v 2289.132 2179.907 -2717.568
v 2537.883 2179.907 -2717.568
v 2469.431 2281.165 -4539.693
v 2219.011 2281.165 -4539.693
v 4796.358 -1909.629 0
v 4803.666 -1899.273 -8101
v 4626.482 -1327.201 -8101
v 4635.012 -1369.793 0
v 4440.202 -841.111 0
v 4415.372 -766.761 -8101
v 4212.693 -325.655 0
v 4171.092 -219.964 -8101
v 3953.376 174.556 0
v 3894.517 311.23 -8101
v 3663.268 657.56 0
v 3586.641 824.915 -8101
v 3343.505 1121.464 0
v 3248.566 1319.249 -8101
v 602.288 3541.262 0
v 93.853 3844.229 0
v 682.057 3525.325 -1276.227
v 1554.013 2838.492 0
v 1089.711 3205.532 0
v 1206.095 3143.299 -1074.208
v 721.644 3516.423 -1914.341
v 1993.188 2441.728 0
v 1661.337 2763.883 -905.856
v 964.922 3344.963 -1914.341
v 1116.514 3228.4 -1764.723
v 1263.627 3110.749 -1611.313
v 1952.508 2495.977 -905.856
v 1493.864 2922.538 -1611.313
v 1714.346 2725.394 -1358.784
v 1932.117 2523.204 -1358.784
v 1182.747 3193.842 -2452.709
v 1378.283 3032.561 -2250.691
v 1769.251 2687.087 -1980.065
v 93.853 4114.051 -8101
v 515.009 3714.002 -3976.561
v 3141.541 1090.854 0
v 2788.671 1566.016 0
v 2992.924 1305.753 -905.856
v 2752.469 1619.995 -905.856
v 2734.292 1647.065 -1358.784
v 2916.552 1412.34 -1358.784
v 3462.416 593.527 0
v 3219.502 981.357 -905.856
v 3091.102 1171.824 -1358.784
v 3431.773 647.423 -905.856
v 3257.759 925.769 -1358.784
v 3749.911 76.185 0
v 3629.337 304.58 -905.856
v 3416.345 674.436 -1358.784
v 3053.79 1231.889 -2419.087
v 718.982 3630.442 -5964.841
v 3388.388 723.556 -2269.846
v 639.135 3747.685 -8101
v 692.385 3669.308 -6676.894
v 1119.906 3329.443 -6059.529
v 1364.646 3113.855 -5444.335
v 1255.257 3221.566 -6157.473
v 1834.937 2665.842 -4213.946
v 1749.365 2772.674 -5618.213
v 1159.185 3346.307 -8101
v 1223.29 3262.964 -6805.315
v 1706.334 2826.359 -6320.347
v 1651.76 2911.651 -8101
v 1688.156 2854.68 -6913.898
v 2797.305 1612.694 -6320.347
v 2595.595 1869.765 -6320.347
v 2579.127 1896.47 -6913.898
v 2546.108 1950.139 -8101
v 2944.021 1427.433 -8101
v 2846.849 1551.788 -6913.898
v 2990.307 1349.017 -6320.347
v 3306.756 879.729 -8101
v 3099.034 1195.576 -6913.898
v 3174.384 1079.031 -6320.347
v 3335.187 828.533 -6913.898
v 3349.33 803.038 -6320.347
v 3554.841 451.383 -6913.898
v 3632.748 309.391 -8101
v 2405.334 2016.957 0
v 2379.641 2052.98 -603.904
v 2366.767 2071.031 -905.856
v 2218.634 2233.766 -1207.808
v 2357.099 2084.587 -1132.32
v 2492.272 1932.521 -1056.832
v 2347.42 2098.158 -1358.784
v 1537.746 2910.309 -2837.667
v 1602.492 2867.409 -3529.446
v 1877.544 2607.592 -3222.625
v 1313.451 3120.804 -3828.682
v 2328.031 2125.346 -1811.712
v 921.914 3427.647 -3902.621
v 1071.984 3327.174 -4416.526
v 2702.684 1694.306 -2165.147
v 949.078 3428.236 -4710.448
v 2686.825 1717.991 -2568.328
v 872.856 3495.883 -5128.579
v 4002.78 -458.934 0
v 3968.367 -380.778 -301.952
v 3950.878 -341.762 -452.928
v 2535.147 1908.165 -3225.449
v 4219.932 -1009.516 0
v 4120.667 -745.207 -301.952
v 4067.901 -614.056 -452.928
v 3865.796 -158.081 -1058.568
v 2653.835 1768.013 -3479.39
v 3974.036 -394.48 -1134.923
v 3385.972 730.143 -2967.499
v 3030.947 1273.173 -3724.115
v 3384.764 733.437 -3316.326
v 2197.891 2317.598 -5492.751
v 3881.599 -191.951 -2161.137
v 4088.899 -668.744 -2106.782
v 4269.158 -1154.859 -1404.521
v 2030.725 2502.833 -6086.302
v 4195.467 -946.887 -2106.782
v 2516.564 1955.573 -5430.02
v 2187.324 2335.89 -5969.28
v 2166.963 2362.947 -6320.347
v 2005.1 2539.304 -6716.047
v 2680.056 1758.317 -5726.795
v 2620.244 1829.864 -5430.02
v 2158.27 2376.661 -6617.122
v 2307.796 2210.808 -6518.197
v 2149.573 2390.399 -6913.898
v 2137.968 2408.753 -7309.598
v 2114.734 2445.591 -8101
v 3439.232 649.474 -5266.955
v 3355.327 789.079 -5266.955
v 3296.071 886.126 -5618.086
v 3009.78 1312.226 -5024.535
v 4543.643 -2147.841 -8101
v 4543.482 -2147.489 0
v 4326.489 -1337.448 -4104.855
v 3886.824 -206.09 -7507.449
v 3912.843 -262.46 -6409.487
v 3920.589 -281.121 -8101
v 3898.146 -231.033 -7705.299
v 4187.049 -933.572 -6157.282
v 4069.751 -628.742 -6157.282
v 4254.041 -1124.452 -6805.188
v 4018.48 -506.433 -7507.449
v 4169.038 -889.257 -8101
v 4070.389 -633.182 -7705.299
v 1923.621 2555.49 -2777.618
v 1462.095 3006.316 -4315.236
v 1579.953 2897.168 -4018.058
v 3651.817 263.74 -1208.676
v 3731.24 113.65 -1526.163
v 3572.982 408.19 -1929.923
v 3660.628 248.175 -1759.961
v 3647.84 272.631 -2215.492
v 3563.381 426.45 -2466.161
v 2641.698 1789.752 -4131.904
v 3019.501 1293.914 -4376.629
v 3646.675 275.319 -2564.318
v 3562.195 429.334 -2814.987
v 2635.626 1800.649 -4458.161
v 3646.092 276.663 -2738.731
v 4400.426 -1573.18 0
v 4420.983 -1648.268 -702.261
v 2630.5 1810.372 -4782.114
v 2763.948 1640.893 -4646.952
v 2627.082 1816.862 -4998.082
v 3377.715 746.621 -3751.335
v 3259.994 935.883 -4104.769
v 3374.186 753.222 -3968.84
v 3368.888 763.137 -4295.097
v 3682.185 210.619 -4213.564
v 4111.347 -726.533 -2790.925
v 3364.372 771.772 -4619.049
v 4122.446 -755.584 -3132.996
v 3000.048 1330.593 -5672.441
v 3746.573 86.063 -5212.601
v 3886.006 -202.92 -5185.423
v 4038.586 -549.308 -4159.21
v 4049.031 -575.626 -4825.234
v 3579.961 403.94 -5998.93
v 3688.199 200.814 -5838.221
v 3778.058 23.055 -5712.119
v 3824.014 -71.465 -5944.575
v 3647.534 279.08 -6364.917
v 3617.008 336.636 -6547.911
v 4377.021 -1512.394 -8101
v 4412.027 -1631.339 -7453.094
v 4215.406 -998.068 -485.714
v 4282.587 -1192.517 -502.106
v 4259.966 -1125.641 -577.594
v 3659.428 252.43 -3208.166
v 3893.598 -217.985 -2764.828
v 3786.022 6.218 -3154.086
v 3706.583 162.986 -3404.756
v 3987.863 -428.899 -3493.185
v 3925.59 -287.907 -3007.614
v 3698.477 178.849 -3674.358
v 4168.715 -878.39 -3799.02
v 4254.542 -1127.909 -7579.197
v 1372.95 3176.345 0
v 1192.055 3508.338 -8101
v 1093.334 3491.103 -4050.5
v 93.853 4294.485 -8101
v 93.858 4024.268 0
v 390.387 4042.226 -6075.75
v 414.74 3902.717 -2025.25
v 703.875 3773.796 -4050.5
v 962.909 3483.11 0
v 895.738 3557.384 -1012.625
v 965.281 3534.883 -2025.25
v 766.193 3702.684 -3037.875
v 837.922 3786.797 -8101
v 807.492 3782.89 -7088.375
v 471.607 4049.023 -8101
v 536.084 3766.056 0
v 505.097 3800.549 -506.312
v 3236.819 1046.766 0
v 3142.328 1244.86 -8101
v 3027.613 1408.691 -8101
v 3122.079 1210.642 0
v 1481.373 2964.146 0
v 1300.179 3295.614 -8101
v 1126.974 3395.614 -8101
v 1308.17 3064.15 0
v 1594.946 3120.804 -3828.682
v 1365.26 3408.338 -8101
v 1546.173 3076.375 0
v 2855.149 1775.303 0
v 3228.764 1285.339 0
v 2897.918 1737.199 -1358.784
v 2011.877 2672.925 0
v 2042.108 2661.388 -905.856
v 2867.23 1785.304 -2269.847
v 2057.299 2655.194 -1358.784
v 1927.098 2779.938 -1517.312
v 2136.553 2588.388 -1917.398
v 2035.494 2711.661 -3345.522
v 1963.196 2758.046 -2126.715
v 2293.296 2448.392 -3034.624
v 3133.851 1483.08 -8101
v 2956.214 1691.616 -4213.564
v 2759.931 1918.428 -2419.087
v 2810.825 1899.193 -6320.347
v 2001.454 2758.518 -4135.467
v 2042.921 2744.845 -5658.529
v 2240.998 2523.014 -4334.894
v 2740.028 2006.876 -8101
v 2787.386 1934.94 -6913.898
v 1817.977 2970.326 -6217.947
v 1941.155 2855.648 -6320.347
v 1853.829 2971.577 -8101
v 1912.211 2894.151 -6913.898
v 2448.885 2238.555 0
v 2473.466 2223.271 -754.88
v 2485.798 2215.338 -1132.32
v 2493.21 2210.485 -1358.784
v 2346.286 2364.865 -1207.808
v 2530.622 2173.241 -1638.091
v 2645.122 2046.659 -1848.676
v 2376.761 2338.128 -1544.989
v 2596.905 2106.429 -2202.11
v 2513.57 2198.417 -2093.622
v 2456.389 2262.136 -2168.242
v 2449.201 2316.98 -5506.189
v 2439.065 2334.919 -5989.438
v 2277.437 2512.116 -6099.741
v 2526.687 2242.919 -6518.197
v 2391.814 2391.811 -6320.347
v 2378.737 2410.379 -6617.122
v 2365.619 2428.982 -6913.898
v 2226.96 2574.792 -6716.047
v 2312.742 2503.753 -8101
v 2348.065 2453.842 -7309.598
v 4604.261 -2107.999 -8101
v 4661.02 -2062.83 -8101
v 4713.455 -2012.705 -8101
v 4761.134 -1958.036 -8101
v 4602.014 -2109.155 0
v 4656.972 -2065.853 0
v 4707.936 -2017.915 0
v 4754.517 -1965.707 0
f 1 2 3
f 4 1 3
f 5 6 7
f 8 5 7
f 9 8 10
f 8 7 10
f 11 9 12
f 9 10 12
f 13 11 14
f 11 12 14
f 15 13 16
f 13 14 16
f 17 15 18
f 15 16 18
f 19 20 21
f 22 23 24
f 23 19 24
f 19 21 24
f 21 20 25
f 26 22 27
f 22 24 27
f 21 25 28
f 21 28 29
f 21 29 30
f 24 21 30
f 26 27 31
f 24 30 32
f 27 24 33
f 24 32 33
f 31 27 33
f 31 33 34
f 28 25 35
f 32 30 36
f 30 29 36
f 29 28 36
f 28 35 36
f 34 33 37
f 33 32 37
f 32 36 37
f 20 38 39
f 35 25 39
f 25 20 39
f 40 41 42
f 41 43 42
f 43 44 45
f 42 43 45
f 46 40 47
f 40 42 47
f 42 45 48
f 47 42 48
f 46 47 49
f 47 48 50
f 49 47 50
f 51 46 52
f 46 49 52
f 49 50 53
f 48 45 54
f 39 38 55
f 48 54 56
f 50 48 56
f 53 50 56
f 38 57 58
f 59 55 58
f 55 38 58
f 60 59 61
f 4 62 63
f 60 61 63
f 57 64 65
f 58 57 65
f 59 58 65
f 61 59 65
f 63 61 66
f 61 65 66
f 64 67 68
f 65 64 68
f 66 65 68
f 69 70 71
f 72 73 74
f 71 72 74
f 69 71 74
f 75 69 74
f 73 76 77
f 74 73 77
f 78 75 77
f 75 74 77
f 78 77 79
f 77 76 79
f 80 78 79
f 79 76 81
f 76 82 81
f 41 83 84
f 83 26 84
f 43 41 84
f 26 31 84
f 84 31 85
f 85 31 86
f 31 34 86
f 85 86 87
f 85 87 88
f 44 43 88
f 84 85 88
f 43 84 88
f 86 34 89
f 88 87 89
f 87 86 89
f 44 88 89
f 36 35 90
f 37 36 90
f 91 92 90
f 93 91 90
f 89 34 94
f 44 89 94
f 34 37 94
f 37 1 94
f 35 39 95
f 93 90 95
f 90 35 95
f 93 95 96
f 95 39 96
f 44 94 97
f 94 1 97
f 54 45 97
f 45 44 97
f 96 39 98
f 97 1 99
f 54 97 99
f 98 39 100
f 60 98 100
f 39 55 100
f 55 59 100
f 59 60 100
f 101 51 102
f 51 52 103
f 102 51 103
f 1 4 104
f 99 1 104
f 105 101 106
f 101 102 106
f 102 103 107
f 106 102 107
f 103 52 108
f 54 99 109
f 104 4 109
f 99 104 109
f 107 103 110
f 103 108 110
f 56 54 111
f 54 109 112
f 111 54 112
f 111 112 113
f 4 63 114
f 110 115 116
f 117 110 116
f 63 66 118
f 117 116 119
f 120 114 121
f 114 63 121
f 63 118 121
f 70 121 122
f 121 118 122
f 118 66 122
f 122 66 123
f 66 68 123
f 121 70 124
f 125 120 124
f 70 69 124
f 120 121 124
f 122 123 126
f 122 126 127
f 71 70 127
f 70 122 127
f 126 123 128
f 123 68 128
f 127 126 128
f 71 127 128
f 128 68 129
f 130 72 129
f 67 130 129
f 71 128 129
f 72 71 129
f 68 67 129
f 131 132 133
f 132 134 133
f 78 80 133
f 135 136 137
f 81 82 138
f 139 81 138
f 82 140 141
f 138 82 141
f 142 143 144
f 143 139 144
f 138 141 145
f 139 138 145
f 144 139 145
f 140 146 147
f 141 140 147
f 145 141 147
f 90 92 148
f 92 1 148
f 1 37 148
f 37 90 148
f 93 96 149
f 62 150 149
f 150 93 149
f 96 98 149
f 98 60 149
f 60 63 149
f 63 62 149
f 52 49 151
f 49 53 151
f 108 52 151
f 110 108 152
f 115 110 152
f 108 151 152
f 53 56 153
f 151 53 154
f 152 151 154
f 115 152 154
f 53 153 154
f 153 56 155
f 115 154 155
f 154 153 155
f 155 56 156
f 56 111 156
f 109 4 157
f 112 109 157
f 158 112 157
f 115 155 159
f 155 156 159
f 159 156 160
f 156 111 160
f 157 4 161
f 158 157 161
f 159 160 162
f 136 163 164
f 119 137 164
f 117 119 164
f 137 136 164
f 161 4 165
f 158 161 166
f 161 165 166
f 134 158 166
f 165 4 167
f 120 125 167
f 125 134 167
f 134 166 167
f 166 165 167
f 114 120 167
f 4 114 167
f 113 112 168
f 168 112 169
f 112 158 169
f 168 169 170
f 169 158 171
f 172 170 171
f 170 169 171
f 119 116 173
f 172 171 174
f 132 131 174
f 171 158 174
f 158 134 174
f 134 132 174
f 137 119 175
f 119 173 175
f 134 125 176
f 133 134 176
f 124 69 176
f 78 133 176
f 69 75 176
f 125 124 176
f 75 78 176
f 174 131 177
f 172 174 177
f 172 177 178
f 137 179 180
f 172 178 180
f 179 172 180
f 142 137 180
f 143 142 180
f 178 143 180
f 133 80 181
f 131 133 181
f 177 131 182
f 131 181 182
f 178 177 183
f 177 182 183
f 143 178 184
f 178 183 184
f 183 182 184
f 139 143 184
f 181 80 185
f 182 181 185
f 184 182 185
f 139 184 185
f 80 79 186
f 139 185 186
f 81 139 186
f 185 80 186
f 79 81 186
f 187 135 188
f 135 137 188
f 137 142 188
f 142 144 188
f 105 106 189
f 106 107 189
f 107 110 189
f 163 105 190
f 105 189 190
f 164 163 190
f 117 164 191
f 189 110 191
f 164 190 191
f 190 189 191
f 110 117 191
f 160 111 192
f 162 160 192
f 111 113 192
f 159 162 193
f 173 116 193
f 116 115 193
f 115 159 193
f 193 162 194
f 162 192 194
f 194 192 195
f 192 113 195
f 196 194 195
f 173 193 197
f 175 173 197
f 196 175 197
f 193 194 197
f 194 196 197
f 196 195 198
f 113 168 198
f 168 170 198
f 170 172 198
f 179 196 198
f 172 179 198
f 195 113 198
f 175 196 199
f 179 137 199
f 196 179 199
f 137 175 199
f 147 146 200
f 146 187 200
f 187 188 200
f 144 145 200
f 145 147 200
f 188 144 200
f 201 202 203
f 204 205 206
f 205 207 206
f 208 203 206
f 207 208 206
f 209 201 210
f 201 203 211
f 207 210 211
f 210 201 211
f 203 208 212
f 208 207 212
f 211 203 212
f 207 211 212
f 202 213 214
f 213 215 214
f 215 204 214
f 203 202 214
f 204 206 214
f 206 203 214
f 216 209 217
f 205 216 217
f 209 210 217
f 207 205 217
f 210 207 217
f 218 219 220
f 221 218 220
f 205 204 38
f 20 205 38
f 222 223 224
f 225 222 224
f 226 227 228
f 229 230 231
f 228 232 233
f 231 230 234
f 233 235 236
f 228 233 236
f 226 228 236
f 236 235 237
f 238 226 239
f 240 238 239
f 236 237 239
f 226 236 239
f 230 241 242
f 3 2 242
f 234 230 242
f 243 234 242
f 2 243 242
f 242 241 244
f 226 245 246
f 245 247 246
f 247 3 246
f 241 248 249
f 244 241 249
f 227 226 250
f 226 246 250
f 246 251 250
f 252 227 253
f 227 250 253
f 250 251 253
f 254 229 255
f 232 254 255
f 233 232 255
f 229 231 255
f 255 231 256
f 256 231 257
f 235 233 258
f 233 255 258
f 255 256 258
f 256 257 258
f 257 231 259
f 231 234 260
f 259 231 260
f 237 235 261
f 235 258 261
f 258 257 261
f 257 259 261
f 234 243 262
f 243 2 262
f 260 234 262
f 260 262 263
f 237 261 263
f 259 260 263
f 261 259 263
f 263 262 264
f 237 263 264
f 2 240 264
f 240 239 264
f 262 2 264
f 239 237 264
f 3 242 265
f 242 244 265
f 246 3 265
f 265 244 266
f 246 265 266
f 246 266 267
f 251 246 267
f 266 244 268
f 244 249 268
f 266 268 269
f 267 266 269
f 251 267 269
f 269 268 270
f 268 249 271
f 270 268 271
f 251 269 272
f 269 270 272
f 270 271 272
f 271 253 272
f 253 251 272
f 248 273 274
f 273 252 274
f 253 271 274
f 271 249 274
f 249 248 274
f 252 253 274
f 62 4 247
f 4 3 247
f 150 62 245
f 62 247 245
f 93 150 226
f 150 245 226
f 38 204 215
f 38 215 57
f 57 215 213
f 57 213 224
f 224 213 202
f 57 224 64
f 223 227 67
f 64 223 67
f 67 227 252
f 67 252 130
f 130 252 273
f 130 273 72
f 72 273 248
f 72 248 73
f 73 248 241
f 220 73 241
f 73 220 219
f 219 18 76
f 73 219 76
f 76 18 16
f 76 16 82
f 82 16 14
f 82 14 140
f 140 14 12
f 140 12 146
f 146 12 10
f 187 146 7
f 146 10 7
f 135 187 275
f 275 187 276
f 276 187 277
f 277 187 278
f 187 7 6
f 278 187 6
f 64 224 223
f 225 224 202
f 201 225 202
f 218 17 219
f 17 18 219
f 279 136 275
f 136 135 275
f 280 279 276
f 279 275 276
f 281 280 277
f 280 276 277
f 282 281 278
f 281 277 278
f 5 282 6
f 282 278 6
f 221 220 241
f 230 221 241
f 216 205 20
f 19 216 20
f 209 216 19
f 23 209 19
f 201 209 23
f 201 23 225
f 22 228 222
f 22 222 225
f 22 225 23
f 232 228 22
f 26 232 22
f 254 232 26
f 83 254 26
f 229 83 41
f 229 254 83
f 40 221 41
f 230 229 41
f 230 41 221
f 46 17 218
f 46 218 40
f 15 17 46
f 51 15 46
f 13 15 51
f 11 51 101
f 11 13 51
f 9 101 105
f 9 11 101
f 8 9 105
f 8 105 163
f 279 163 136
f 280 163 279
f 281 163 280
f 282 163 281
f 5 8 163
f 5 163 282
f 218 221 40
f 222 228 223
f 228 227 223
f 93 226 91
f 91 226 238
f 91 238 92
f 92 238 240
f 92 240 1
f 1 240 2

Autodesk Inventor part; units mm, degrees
ref_plane "XZ Plane" through (0, 0, 0) normal (0, 1, 0) x (-1, 0, 0)
sketch "Sketch1" plane through (0, 0, 0) normal (0, 0, 1) x (1, 0, 0)
  arc A0 (4796.3585, -1909.6289) -> (3343.4744, 1121.5056) centre (-3903.1767, -4215.7265) ccw
  line L0 (3236.8192, 1046.7661) -> (3343.5051, 1121.464)
  arc A1 (3228.7635, 1285.3391) -> (1546.1726, 3076.3751) centre (-4110.5601, -3923.7232) ccw
  line L1 (3228.7635, 1285.3391) -> (3122.0787, 1210.6419)
  line L2 (1372.9503, 3176.3452) -> (1308.1705, 3064.1503)
  arc A2 (1372.9503, 3176.3452) -> (93.8576, 4024.2684) centre (-4221.2651, -3873.8147) ccw
  line L3 (1481.3729, 2964.1457) -> (1546.1726, 3076.3751)
  arc A3 (4543.4821, -2147.4888) -> (93.8528, 3844.2289) centre (-4256.4671, -4034.5221) ccw
  line L4 (93.8576, 4024.2684) -> (93.8528, 3844.2289)
  line L5 (1308.1705, 3064.1503) -> (1481.3729, 2964.1457)
  line L6 (3122.0787, 1210.6419) -> (3236.8192, 1046.7661)
  arc A4 (4543.4821, -2147.4888) -> (4796.3585, -1909.6289) centre (4134.8595, -1459.7188) ccw
  point P0 (0, 0)
  dimension "d7" = 800
ref_plane "Work Plane2" through (0, 0, -8101) normal (0, 0, 1) x (1, 0, 0)
ref_plane "Work Plane1" through (0, 0, 0) normal (0, 0, 1) x (1, 0, 0)
sketch "Sketch2" plane through (0, 0, -8101) normal (0, 0, 1) x (1, 0, 0)
  arc A0 (1192.0552, 3508.338) -> (93.8528, 4294.485) centre (-5164.5547, -4211.3454) ccw projected
  arc A1 (3133.8513, 1483.0798) -> (1365.2603, 3408.338) centre (-5051.6105, -4261.3276) ccw projected
  arc A2 (4543.6426, -2147.8414) -> (93.8528, 4114.0508) centre (-5207.4444, -4365.1147) ccw projected
  line L0 (1192.0552, 3508.338) -> (1126.9741, 3395.6142) projected
  line L1 (1365.2603, 3408.338) -> (1300.1792, 3295.6142) projected
  line L2 (1126.9741, 3395.6142) -> (1300.1792, 3295.6142) projected
  line L3 (93.8528, 4294.485) -> (93.8528, 4114.0508) projected
  line L4 (3027.6129, 1408.6909) -> (3133.8513, 1483.0798) projected
  line L5 (3142.3282, 1244.8605) -> (3248.5665, 1319.2494) projected
  line L6 (3027.6129, 1408.6909) -> (3142.3282, 1244.8605) projected
  arc A3 (4803.6655, -1899.2732) -> (3248.5665, 1319.2494) centre (-4832.968, -4570.4704) ccw projected
  arc A4 (4543.6426, -2147.8414) -> (4803.6655, -1899.2732) centre (4135.0016, -1460.0824) ccw projected
  point P0 (0, 0)
loft "Loft1" add profiles "Sketch1", "Sketch2"
ref_plane "Work Plane3" through (2600, 0, 0) normal (1, 0, 0) x (0, 1, 0)
sketch "Sketch3" plane through (2600, 0, 0) normal (1, 0, 0) x (0, 1, 0)
  line L0 (3120.8038, -3828.6818) -> (2179.9067, -2717.5683)
  line L1 (2179.9067, -2717.5683) -> (2281.1646, -4539.693)
  line L2 (2281.1646, -4539.693) -> (3120.8038, -3828.6818)
  point P0 (0, 0)
extrude "Extrusion1" cut sketch "Sketch3" against normal through all
properties part number "panel_block_03" material "Wood (Maple)"
